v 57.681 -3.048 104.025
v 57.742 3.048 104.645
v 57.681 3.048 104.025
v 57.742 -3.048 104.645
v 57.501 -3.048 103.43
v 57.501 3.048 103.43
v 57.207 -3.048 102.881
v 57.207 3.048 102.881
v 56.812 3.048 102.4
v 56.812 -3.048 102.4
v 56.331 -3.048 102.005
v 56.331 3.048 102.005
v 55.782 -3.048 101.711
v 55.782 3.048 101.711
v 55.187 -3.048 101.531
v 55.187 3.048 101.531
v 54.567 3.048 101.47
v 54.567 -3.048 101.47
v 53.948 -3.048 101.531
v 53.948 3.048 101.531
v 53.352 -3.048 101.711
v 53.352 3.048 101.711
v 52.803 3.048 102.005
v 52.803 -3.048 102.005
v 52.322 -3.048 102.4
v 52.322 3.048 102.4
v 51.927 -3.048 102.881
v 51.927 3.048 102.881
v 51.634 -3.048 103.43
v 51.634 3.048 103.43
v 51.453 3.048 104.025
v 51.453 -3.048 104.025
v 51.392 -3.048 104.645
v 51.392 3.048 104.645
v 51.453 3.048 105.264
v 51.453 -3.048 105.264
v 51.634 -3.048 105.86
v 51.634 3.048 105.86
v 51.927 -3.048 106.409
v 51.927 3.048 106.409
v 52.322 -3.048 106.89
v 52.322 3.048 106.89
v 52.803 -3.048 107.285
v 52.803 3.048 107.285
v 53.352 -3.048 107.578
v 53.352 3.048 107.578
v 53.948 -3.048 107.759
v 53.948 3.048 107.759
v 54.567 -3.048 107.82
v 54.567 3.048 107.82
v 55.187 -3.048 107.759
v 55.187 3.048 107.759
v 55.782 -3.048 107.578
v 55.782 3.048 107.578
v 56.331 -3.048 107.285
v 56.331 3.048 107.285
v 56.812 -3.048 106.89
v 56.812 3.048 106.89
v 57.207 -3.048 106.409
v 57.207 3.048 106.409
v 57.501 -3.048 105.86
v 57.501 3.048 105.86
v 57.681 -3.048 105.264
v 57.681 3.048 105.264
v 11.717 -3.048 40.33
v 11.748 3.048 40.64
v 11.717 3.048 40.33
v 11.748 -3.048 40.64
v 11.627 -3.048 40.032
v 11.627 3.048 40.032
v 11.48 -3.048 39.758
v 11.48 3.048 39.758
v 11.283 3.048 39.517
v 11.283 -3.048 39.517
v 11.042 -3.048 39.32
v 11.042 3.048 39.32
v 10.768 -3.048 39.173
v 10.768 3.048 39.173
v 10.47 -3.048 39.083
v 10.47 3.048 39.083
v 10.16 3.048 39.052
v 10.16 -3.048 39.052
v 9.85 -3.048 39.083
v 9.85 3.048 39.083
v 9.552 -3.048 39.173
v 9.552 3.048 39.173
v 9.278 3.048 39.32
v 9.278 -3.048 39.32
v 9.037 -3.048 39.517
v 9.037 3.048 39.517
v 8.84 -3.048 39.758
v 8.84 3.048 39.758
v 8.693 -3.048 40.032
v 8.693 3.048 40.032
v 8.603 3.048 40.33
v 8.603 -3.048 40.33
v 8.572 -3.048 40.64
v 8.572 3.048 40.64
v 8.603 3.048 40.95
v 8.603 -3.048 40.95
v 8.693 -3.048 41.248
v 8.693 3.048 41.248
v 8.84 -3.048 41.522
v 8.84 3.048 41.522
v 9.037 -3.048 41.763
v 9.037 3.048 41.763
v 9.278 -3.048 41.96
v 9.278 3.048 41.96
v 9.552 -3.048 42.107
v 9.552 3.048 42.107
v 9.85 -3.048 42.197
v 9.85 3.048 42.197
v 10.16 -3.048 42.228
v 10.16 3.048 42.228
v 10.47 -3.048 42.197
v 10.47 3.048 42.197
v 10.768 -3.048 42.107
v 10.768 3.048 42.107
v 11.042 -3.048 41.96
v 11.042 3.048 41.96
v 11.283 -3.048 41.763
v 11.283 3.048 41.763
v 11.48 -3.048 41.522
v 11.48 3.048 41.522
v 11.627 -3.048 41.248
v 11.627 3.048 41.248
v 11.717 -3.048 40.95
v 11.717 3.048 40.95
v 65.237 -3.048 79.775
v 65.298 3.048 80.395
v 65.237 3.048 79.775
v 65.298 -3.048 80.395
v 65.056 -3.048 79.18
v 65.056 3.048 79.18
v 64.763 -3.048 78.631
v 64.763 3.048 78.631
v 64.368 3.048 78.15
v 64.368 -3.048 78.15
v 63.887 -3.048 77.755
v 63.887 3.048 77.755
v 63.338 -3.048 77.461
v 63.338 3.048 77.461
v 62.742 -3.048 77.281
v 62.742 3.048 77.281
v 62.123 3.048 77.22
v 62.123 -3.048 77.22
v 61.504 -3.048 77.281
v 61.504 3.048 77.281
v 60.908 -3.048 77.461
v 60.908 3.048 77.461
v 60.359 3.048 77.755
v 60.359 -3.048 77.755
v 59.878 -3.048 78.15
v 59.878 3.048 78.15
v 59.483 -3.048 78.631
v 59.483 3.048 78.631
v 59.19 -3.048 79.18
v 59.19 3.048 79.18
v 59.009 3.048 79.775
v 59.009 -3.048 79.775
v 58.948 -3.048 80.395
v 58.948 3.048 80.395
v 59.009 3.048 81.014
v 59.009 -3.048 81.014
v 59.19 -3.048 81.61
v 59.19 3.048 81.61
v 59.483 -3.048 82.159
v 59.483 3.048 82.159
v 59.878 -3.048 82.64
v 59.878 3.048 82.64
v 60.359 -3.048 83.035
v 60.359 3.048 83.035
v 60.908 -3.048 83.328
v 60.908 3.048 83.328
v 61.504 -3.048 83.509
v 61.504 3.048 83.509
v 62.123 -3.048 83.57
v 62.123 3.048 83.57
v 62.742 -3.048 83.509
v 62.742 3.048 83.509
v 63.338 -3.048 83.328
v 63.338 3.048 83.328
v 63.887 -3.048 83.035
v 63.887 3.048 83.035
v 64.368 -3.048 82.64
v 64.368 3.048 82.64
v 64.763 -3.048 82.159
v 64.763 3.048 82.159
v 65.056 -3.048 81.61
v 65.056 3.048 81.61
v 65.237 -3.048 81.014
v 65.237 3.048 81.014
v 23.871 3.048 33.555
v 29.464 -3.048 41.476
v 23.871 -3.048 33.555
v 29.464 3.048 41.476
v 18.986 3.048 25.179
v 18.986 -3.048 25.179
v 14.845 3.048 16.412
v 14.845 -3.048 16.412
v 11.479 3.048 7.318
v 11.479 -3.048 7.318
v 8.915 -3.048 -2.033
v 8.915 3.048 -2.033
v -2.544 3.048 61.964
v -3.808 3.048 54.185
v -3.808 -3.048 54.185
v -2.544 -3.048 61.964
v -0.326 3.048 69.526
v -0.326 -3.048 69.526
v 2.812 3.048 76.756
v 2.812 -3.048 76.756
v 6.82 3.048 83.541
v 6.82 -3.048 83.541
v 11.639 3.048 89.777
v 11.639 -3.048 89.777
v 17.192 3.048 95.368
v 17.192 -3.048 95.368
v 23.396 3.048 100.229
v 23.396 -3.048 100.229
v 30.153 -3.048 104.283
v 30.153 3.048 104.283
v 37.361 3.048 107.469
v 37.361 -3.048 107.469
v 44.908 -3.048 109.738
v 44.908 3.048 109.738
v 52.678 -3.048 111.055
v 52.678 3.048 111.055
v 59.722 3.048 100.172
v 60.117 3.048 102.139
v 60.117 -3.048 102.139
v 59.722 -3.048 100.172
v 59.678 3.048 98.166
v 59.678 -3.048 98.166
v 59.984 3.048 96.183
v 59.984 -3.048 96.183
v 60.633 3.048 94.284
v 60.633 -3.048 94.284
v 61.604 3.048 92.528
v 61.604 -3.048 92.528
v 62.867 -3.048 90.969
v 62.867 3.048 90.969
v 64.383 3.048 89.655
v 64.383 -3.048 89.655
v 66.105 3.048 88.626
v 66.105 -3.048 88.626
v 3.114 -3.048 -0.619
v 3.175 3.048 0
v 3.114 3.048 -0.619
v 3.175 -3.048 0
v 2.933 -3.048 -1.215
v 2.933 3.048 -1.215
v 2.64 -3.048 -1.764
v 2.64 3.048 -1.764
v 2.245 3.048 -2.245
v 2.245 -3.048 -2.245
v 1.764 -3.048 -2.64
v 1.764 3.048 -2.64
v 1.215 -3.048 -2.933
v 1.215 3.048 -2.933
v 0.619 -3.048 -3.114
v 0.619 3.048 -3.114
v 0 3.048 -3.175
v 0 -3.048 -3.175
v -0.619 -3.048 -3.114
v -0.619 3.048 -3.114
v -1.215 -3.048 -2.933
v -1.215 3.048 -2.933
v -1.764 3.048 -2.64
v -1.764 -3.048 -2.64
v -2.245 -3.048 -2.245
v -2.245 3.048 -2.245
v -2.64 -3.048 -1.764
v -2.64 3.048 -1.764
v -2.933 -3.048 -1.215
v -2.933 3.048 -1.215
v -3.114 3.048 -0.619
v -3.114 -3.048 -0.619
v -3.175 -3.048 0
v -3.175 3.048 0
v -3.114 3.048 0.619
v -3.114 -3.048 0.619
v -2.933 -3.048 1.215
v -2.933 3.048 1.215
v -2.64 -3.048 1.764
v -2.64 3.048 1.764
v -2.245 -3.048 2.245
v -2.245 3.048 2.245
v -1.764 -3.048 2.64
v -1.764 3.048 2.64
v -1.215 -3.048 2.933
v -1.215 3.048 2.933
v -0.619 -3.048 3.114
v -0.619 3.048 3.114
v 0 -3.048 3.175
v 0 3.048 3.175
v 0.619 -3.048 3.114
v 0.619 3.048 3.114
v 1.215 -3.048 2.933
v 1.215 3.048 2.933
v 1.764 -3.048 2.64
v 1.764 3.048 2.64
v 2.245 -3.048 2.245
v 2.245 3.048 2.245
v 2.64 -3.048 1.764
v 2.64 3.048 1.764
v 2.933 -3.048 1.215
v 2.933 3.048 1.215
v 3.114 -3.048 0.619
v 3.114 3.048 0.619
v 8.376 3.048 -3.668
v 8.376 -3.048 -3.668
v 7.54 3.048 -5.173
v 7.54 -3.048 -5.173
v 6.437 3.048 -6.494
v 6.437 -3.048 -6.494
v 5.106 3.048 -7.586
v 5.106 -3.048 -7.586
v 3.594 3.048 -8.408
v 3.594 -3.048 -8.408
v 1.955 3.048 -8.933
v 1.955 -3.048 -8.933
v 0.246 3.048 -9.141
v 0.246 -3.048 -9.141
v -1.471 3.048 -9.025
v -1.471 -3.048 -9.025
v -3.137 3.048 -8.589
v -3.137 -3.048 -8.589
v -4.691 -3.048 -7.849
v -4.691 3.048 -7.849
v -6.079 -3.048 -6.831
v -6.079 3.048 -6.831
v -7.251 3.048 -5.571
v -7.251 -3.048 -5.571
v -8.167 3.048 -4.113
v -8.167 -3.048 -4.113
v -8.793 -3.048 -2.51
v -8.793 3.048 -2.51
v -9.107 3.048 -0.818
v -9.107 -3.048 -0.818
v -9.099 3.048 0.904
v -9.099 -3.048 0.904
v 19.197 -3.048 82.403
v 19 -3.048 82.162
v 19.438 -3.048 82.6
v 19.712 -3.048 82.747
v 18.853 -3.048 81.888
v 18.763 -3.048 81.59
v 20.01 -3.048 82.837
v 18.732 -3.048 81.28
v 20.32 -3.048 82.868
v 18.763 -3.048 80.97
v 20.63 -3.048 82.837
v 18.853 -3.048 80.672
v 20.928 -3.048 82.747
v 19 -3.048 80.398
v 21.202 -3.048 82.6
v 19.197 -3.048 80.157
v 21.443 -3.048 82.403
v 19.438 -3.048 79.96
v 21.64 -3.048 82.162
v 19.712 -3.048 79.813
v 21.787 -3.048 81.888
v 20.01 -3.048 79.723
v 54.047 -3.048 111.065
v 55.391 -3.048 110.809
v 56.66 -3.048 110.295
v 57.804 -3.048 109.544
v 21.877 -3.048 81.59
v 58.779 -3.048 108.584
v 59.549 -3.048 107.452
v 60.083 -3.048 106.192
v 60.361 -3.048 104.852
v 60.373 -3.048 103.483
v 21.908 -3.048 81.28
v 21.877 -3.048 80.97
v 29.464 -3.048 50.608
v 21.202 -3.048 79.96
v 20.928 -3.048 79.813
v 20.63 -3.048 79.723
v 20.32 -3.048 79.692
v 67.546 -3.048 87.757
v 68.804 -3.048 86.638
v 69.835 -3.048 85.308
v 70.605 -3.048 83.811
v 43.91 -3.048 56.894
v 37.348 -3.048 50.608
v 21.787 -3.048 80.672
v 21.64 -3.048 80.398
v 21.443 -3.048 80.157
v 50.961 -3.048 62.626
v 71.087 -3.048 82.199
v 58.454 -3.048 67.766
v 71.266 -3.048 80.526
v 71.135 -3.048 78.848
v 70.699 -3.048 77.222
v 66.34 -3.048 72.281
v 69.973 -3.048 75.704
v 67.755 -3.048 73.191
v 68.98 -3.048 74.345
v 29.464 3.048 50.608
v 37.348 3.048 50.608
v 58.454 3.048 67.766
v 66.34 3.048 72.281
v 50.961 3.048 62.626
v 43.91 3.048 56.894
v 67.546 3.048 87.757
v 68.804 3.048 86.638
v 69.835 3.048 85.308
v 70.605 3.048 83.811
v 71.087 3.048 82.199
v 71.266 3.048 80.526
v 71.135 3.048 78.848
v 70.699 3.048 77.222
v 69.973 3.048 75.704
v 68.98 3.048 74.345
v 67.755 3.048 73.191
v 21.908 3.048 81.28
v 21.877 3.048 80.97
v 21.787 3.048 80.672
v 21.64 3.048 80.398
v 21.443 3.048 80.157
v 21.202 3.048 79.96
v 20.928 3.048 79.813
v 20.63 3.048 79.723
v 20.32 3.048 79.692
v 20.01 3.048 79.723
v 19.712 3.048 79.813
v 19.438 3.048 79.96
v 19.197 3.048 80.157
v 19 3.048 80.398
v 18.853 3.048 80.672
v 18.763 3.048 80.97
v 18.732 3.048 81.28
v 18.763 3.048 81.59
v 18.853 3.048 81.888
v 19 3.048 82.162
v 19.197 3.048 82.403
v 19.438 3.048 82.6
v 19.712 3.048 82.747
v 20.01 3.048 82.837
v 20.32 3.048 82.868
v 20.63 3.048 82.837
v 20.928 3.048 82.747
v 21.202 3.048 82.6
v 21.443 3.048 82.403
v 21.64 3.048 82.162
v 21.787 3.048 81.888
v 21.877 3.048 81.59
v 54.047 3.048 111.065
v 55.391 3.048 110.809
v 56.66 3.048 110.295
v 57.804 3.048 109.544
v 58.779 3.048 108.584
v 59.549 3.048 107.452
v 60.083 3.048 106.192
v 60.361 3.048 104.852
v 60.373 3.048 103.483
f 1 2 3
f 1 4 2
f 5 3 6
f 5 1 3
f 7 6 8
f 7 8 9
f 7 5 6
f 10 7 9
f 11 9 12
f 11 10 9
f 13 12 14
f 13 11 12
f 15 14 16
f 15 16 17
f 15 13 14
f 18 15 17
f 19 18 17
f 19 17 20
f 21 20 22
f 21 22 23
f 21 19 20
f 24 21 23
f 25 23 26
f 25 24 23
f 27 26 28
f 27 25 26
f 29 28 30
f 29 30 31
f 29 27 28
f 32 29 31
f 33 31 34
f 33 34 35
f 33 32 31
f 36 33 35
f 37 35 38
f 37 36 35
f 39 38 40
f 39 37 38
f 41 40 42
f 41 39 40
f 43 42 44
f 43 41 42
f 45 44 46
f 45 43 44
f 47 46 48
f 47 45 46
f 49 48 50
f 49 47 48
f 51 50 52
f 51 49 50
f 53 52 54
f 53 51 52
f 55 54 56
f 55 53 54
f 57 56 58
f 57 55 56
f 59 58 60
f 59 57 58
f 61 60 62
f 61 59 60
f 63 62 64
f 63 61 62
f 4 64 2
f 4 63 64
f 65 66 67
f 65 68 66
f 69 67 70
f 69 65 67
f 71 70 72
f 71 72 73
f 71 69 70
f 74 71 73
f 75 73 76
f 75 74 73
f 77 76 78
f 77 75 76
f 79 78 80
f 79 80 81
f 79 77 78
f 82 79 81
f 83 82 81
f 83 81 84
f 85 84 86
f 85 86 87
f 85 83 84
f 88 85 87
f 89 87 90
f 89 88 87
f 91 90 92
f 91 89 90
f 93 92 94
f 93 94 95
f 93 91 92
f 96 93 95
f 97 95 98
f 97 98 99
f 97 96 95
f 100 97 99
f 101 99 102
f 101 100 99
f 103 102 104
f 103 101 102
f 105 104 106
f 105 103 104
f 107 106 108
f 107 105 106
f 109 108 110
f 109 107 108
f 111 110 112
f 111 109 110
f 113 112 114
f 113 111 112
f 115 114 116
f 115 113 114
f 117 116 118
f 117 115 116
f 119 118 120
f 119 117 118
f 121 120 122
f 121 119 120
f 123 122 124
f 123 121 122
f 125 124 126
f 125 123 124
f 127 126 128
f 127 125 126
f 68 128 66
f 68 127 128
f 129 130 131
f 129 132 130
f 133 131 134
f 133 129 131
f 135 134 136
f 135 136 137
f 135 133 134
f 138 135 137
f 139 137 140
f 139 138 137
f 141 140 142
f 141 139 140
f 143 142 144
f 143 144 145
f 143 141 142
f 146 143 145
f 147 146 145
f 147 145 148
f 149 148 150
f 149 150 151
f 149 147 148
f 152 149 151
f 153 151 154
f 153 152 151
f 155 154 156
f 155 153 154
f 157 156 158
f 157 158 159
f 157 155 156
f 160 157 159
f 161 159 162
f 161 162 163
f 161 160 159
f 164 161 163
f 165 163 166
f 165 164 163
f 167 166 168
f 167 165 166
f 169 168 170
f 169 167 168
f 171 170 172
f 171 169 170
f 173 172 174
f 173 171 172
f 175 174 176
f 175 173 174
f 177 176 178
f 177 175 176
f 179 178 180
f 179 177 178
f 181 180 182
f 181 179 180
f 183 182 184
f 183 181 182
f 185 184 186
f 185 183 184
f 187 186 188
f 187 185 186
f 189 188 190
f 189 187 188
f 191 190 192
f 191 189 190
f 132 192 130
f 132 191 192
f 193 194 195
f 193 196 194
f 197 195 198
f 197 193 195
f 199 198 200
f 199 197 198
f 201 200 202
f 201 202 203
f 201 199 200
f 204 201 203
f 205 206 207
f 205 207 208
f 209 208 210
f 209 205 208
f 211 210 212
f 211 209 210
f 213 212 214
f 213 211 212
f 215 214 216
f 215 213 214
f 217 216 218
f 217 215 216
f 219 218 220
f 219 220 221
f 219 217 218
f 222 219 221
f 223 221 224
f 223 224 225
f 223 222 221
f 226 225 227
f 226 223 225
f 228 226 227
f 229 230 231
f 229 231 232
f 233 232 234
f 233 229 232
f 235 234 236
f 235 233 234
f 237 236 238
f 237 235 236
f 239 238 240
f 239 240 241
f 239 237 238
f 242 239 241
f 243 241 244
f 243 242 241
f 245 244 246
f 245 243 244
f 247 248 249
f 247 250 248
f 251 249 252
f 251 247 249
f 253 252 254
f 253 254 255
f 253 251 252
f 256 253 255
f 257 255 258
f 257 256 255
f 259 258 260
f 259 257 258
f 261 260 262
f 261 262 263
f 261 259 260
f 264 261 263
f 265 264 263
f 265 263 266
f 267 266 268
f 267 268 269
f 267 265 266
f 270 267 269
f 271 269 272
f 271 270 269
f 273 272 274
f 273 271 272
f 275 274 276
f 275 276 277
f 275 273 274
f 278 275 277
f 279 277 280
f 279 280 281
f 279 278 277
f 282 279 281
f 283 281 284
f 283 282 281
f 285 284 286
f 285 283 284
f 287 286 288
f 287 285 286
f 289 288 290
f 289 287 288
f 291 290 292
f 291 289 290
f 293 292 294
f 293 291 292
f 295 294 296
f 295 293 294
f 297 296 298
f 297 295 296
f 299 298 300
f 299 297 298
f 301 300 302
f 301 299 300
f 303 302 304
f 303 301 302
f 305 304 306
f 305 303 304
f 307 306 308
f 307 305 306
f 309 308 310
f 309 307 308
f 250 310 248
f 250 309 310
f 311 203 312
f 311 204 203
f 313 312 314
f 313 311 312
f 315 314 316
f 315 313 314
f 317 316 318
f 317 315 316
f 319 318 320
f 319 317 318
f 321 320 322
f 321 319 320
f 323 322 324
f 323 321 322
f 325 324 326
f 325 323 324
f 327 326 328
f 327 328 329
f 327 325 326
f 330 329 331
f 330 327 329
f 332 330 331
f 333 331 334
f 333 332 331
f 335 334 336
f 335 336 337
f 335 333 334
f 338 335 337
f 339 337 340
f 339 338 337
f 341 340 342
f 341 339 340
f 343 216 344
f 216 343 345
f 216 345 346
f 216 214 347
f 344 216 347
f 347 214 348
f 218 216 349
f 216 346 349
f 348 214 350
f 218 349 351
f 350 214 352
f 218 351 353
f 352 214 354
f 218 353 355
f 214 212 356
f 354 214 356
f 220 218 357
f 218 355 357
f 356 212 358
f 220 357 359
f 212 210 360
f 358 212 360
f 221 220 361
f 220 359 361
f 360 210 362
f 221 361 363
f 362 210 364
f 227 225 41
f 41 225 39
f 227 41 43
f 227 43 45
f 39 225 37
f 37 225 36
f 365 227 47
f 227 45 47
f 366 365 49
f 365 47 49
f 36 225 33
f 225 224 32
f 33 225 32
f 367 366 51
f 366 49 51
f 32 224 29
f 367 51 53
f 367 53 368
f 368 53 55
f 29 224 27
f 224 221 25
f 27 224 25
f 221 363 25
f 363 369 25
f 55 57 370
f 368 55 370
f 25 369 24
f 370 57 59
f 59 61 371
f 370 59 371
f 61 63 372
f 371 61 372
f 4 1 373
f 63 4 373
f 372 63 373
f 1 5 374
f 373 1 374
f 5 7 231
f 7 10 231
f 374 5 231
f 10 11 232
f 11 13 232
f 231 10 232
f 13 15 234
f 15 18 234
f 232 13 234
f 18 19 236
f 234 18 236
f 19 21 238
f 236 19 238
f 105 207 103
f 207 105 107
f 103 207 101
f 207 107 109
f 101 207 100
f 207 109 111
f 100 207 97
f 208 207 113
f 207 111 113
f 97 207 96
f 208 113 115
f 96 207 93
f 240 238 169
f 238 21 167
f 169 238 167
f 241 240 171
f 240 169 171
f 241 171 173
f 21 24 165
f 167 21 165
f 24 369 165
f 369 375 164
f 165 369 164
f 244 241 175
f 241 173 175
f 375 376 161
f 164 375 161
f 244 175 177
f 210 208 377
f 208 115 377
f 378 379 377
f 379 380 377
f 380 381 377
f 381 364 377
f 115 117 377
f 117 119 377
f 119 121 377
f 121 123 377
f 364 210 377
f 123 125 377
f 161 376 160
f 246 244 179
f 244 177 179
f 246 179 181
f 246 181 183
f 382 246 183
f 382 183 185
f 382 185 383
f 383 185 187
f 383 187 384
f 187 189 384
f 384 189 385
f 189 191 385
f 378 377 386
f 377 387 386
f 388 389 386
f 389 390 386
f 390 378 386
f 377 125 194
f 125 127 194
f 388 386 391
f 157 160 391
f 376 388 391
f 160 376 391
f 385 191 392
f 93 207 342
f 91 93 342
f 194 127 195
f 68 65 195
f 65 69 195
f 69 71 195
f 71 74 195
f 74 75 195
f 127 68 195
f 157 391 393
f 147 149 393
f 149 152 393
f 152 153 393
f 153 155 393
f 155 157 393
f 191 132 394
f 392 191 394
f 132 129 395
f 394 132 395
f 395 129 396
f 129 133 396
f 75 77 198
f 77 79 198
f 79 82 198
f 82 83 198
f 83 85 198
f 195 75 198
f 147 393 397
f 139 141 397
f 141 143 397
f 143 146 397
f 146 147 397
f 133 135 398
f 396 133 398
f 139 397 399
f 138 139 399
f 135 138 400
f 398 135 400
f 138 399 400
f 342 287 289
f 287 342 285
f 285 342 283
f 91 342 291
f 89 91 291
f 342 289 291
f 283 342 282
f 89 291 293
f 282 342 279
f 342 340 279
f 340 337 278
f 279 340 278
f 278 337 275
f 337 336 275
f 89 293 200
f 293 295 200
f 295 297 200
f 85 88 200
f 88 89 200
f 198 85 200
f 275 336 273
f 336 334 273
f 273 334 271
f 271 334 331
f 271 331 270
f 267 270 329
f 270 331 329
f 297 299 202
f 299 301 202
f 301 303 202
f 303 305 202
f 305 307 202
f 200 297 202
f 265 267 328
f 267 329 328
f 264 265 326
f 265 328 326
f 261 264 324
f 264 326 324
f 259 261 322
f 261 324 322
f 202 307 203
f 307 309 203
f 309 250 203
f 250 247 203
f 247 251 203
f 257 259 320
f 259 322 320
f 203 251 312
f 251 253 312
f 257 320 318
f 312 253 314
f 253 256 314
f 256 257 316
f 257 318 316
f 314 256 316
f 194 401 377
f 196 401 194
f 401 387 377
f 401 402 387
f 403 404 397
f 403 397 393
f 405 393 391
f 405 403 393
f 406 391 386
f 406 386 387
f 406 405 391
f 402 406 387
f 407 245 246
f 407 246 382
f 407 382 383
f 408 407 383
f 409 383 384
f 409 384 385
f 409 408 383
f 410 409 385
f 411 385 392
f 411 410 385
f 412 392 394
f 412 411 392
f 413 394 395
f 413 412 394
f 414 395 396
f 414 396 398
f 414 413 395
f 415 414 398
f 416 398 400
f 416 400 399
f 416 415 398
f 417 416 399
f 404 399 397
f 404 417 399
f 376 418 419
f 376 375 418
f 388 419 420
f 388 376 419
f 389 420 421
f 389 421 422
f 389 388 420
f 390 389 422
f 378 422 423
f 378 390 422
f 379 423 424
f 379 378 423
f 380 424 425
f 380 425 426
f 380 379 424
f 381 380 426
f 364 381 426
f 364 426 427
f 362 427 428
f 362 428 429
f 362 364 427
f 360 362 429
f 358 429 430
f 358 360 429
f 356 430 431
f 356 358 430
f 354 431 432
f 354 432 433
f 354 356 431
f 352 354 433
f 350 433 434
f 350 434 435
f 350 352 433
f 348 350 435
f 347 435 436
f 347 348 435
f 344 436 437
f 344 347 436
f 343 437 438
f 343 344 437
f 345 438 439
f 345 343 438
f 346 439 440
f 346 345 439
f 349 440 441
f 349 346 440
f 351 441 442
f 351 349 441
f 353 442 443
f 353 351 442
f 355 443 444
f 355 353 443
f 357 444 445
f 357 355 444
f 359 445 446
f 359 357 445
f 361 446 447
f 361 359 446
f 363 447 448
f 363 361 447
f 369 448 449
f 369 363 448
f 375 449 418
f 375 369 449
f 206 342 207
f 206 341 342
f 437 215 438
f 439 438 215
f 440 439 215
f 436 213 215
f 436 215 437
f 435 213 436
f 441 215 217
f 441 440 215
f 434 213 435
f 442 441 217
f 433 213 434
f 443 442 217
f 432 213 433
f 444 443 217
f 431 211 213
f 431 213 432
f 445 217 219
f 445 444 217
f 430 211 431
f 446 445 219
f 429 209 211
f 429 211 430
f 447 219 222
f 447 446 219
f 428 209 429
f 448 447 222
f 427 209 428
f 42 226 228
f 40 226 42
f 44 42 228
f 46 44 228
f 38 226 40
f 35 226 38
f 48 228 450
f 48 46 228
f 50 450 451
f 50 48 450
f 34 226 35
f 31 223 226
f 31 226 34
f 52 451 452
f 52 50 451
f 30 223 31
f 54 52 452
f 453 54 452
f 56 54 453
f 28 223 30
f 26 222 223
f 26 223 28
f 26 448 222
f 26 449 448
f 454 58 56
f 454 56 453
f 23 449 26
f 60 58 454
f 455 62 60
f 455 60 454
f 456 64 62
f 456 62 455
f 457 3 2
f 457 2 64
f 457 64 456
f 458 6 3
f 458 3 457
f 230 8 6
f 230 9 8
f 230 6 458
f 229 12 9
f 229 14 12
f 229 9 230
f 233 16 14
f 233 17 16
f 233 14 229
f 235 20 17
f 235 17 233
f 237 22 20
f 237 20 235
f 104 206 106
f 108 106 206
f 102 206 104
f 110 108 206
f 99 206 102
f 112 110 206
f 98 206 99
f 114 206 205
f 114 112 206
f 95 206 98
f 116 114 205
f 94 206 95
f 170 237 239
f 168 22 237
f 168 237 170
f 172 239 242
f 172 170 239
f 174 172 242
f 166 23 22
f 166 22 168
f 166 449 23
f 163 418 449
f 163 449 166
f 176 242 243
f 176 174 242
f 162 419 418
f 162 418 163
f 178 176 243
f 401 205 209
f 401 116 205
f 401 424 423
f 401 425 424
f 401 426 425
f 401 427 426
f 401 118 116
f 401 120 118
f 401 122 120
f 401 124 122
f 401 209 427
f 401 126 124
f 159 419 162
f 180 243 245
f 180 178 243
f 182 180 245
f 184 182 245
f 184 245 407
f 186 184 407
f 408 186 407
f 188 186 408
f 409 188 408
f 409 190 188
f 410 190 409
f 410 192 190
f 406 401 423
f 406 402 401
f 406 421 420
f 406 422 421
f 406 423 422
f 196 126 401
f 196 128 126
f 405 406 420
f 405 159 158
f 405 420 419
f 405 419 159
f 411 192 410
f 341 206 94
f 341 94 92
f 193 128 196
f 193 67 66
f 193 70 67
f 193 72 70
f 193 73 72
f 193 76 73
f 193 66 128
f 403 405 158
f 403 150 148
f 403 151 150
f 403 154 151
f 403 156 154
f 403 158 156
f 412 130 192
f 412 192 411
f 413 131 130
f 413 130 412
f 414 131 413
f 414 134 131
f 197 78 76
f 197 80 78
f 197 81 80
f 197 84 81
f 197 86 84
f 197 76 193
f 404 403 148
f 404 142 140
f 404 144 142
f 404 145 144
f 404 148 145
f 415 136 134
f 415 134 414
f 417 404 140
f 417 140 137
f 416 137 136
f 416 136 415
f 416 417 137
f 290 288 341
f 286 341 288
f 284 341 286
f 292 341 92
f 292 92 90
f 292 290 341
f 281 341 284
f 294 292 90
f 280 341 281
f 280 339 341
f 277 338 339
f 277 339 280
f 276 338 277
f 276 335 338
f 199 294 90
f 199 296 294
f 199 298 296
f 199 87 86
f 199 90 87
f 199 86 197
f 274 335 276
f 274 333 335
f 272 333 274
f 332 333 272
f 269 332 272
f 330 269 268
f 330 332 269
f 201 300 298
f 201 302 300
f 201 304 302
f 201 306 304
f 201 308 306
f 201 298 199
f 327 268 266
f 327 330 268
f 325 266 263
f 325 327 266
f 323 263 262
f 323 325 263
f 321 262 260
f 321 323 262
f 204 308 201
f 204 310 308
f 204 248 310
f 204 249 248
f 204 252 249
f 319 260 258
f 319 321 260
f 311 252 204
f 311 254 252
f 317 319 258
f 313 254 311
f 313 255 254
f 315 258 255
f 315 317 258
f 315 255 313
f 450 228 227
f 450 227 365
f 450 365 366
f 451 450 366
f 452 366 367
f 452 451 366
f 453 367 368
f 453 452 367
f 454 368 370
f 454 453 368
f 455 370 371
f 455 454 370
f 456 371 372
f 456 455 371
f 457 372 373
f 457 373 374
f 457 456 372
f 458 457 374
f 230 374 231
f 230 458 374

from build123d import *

# Parameters (mm, degrees)
SKETCH1_R           = 3.175
SKETCH1_R_2         = 1.5875
BOSS_EXTRUDE1_DEPTH = 3.048


with BuildPart() as part:
    # Sketch1 → Boss-Extrude1 (new, symmetric)
    with BuildSketch(Plane(origin=(0, 0, 0), x_dir=(1, 0, 0), z_dir=(0, 1, 0))):
        with BuildLine():
            Line((-9.099235244, -0.903689094), (-3.807571336, -54.185393016))
            ThreePointArc((-3.807571336, -54.185393016), (14.328591511, -92.658850534), (52.678421921, -111.054987185))
            ThreePointArc((52.678421921, -111.054987185), (58.779230265, -108.583775292), (60.117170229, -102.138880621))
            ThreePointArc((60.117170229, -102.138880621), (60.633172254, -94.28427436), (66.105273821, -88.625899853))
            ThreePointArc((66.105273821, -88.625899853), (71.266071099, -80.525710338), (66.339661954, -72.280870032))
            ThreePointArc((66.339661954, -72.280870032), (50.960508132, -62.625906994), (37.347898209, -50.607856626))
            Line((37.347898209, -50.607856626), (29.464, -50.607856626))
            Line((29.464, -50.607856626), (29.464, -41.476271417))
            ThreePointArc((29.464, -41.476271417), (16.820103433, -20.840439396), (8.915029824, 2.033464836))
            ThreePointArc((8.915029824, 2.033464836), (-1.47146227, 9.024828796), (-9.099235244, -0.903689094))
        make_face()
        Circle(SKETCH1_R, mode=Mode.SUBTRACT)
        with Locations((62.123011123, -80.394598631)):
            Circle(SKETCH1_R, mode=Mode.SUBTRACT)
        with Locations((54.567235003, -104.644758367)):
            Circle(SKETCH1_R, mode=Mode.SUBTRACT)
        with Locations((10.16, -40.64)):
            Circle(SKETCH1_R_2, mode=Mode.SUBTRACT)
        with Locations((20.32, -81.28)):
            Circle(SKETCH1_R_2, mode=Mode.SUBTRACT)
    extrude(amount=BOSS_EXTRUDE1_DEPTH, both=True)


solid = part.part
